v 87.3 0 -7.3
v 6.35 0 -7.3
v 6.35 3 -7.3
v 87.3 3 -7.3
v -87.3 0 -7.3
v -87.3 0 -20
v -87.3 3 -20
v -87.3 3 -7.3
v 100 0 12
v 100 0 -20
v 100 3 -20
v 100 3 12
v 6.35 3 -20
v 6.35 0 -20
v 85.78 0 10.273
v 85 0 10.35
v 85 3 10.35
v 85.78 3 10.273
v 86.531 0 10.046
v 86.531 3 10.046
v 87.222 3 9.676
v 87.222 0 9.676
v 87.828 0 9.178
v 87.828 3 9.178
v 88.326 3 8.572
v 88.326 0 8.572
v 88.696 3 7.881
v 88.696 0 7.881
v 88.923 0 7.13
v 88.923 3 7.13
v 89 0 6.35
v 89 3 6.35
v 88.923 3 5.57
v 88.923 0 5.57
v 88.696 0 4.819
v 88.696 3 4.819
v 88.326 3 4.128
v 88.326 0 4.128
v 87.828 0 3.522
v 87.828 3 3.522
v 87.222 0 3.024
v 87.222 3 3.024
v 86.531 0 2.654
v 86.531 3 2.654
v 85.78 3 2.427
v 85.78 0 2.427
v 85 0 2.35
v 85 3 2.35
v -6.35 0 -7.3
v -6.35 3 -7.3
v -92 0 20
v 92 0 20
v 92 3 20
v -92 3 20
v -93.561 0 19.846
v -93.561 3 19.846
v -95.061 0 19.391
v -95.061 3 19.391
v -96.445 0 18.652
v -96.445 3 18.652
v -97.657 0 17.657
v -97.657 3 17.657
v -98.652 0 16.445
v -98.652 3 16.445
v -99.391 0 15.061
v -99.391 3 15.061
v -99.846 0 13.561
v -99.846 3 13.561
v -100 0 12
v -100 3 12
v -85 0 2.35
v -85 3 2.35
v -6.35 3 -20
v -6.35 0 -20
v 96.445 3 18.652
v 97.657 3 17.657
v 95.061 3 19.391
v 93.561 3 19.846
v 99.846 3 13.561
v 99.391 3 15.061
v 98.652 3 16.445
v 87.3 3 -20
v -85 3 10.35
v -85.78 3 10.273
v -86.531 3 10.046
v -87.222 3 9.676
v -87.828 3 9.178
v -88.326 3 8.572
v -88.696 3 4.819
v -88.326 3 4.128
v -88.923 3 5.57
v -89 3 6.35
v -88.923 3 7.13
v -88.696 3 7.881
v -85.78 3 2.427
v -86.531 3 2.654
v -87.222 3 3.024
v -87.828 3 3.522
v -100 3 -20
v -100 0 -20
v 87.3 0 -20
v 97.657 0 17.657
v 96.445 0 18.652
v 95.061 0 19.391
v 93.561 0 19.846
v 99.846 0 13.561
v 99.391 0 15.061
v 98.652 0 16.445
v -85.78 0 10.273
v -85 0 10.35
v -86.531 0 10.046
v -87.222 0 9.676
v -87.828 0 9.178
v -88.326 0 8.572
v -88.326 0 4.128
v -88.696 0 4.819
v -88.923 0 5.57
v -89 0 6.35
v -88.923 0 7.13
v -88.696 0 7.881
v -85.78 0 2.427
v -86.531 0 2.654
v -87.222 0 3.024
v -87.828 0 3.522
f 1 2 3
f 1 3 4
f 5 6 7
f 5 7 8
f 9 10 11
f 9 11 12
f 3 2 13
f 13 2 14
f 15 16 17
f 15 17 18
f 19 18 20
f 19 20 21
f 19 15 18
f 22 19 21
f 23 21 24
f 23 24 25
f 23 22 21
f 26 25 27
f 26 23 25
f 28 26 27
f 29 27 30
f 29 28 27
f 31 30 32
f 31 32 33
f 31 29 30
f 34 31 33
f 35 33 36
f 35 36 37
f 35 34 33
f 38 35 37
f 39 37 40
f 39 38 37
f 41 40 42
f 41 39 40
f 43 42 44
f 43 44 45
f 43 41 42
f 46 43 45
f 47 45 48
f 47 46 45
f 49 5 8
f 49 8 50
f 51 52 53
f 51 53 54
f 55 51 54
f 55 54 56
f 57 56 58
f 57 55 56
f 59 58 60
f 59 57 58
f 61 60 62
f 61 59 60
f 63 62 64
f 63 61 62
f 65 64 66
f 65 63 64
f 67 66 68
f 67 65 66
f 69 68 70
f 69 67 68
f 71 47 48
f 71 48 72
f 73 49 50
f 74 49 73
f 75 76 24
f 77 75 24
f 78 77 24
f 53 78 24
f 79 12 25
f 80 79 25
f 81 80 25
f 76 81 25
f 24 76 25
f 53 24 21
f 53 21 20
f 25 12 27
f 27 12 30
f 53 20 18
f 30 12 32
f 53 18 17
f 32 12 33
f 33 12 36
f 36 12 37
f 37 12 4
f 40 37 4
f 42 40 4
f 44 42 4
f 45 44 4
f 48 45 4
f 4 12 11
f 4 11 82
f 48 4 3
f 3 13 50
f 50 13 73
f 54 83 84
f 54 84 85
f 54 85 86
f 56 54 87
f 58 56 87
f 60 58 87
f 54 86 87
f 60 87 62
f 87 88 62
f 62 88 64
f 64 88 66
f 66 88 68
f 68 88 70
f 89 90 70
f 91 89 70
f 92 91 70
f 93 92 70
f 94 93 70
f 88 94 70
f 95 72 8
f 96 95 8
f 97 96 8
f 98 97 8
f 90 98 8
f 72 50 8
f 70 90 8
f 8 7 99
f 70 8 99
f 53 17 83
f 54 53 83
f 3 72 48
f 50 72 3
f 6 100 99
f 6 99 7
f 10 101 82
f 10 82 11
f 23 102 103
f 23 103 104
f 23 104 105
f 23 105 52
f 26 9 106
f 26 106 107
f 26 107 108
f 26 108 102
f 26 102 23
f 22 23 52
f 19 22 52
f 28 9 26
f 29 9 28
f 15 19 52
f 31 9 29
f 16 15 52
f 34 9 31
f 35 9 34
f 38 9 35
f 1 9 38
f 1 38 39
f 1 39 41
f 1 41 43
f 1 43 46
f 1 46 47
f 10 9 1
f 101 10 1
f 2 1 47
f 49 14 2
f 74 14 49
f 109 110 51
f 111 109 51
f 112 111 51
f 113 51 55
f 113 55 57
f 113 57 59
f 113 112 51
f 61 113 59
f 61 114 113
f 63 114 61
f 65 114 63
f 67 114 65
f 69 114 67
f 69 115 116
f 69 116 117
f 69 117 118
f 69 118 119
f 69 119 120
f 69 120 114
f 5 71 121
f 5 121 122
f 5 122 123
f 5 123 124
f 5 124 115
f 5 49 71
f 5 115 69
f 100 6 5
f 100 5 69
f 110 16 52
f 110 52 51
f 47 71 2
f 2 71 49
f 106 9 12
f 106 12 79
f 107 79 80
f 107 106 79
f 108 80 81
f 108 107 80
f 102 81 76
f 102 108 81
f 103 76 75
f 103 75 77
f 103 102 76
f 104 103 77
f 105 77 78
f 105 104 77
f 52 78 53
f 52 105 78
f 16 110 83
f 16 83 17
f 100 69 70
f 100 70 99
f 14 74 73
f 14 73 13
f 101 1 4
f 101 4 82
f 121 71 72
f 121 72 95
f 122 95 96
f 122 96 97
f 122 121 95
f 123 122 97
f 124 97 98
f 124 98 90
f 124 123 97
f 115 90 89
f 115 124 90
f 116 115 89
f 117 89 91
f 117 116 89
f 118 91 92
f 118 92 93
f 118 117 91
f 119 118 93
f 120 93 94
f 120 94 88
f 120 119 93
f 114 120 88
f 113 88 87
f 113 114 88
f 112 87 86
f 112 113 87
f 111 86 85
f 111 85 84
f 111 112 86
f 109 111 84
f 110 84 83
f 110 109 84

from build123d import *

# Parameters (mm, degrees)
SKETCH1_W           = 12.7
SKETCH1_H           = 12.7
BOSS_EXTRUDE1_DEPTH = 3


with BuildPart() as part:
    # Sketch1 → Boss-Extrude1 (new body)
    # profile 1 of 2: a face of its own
    with BuildSketch(Plane(origin=(0, 0, 0), x_dir=(1, 0, 0), z_dir=(0, 1, 0))):
        with BuildLine():
            ThreePointArc((-92, -20), (-97.656854249, -17.656854249), (-100, -12))
            Line((-100, -12), (-100, 20))
            Line((-100, 20), (-87.3, 20))
            Line((-87.3, 20), (-87.3, 7.3))
            Line((-87.3, 7.3), (87.3, 7.3))
            Line((87.3, 7.3), (87.3, 20))
            Line((87.3, 20), (100, 20))
            Line((100, 20), (100, -12))
            ThreePointArc((100, -12), (97.656854249, -17.656854249), (92, -20))
            Line((92, -20), (-92, -20))
        make_face()
        with BuildLine():
            ThreePointArc((85, -10.35), (89, -6.35), (85, -2.35))
            Line((85, -2.35), (-85, -2.35))
            ThreePointArc((-85, -2.35), (-89, -6.35), (-85, -10.35))
            Line((-85, -10.35), (85, -10.35))
        make_face(mode=Mode.SUBTRACT)
    # profile 2 of 2: a face of its own
    with BuildSketch(Plane(origin=(0, 0, 0), x_dir=(1, 0, 0), z_dir=(0, 1, 0))):
        with Locations((0, 13.65)):
            Rectangle(SKETCH1_W, SKETCH1_H)
    extrude(amount=BOSS_EXTRUDE1_DEPTH)


solid = part.part
